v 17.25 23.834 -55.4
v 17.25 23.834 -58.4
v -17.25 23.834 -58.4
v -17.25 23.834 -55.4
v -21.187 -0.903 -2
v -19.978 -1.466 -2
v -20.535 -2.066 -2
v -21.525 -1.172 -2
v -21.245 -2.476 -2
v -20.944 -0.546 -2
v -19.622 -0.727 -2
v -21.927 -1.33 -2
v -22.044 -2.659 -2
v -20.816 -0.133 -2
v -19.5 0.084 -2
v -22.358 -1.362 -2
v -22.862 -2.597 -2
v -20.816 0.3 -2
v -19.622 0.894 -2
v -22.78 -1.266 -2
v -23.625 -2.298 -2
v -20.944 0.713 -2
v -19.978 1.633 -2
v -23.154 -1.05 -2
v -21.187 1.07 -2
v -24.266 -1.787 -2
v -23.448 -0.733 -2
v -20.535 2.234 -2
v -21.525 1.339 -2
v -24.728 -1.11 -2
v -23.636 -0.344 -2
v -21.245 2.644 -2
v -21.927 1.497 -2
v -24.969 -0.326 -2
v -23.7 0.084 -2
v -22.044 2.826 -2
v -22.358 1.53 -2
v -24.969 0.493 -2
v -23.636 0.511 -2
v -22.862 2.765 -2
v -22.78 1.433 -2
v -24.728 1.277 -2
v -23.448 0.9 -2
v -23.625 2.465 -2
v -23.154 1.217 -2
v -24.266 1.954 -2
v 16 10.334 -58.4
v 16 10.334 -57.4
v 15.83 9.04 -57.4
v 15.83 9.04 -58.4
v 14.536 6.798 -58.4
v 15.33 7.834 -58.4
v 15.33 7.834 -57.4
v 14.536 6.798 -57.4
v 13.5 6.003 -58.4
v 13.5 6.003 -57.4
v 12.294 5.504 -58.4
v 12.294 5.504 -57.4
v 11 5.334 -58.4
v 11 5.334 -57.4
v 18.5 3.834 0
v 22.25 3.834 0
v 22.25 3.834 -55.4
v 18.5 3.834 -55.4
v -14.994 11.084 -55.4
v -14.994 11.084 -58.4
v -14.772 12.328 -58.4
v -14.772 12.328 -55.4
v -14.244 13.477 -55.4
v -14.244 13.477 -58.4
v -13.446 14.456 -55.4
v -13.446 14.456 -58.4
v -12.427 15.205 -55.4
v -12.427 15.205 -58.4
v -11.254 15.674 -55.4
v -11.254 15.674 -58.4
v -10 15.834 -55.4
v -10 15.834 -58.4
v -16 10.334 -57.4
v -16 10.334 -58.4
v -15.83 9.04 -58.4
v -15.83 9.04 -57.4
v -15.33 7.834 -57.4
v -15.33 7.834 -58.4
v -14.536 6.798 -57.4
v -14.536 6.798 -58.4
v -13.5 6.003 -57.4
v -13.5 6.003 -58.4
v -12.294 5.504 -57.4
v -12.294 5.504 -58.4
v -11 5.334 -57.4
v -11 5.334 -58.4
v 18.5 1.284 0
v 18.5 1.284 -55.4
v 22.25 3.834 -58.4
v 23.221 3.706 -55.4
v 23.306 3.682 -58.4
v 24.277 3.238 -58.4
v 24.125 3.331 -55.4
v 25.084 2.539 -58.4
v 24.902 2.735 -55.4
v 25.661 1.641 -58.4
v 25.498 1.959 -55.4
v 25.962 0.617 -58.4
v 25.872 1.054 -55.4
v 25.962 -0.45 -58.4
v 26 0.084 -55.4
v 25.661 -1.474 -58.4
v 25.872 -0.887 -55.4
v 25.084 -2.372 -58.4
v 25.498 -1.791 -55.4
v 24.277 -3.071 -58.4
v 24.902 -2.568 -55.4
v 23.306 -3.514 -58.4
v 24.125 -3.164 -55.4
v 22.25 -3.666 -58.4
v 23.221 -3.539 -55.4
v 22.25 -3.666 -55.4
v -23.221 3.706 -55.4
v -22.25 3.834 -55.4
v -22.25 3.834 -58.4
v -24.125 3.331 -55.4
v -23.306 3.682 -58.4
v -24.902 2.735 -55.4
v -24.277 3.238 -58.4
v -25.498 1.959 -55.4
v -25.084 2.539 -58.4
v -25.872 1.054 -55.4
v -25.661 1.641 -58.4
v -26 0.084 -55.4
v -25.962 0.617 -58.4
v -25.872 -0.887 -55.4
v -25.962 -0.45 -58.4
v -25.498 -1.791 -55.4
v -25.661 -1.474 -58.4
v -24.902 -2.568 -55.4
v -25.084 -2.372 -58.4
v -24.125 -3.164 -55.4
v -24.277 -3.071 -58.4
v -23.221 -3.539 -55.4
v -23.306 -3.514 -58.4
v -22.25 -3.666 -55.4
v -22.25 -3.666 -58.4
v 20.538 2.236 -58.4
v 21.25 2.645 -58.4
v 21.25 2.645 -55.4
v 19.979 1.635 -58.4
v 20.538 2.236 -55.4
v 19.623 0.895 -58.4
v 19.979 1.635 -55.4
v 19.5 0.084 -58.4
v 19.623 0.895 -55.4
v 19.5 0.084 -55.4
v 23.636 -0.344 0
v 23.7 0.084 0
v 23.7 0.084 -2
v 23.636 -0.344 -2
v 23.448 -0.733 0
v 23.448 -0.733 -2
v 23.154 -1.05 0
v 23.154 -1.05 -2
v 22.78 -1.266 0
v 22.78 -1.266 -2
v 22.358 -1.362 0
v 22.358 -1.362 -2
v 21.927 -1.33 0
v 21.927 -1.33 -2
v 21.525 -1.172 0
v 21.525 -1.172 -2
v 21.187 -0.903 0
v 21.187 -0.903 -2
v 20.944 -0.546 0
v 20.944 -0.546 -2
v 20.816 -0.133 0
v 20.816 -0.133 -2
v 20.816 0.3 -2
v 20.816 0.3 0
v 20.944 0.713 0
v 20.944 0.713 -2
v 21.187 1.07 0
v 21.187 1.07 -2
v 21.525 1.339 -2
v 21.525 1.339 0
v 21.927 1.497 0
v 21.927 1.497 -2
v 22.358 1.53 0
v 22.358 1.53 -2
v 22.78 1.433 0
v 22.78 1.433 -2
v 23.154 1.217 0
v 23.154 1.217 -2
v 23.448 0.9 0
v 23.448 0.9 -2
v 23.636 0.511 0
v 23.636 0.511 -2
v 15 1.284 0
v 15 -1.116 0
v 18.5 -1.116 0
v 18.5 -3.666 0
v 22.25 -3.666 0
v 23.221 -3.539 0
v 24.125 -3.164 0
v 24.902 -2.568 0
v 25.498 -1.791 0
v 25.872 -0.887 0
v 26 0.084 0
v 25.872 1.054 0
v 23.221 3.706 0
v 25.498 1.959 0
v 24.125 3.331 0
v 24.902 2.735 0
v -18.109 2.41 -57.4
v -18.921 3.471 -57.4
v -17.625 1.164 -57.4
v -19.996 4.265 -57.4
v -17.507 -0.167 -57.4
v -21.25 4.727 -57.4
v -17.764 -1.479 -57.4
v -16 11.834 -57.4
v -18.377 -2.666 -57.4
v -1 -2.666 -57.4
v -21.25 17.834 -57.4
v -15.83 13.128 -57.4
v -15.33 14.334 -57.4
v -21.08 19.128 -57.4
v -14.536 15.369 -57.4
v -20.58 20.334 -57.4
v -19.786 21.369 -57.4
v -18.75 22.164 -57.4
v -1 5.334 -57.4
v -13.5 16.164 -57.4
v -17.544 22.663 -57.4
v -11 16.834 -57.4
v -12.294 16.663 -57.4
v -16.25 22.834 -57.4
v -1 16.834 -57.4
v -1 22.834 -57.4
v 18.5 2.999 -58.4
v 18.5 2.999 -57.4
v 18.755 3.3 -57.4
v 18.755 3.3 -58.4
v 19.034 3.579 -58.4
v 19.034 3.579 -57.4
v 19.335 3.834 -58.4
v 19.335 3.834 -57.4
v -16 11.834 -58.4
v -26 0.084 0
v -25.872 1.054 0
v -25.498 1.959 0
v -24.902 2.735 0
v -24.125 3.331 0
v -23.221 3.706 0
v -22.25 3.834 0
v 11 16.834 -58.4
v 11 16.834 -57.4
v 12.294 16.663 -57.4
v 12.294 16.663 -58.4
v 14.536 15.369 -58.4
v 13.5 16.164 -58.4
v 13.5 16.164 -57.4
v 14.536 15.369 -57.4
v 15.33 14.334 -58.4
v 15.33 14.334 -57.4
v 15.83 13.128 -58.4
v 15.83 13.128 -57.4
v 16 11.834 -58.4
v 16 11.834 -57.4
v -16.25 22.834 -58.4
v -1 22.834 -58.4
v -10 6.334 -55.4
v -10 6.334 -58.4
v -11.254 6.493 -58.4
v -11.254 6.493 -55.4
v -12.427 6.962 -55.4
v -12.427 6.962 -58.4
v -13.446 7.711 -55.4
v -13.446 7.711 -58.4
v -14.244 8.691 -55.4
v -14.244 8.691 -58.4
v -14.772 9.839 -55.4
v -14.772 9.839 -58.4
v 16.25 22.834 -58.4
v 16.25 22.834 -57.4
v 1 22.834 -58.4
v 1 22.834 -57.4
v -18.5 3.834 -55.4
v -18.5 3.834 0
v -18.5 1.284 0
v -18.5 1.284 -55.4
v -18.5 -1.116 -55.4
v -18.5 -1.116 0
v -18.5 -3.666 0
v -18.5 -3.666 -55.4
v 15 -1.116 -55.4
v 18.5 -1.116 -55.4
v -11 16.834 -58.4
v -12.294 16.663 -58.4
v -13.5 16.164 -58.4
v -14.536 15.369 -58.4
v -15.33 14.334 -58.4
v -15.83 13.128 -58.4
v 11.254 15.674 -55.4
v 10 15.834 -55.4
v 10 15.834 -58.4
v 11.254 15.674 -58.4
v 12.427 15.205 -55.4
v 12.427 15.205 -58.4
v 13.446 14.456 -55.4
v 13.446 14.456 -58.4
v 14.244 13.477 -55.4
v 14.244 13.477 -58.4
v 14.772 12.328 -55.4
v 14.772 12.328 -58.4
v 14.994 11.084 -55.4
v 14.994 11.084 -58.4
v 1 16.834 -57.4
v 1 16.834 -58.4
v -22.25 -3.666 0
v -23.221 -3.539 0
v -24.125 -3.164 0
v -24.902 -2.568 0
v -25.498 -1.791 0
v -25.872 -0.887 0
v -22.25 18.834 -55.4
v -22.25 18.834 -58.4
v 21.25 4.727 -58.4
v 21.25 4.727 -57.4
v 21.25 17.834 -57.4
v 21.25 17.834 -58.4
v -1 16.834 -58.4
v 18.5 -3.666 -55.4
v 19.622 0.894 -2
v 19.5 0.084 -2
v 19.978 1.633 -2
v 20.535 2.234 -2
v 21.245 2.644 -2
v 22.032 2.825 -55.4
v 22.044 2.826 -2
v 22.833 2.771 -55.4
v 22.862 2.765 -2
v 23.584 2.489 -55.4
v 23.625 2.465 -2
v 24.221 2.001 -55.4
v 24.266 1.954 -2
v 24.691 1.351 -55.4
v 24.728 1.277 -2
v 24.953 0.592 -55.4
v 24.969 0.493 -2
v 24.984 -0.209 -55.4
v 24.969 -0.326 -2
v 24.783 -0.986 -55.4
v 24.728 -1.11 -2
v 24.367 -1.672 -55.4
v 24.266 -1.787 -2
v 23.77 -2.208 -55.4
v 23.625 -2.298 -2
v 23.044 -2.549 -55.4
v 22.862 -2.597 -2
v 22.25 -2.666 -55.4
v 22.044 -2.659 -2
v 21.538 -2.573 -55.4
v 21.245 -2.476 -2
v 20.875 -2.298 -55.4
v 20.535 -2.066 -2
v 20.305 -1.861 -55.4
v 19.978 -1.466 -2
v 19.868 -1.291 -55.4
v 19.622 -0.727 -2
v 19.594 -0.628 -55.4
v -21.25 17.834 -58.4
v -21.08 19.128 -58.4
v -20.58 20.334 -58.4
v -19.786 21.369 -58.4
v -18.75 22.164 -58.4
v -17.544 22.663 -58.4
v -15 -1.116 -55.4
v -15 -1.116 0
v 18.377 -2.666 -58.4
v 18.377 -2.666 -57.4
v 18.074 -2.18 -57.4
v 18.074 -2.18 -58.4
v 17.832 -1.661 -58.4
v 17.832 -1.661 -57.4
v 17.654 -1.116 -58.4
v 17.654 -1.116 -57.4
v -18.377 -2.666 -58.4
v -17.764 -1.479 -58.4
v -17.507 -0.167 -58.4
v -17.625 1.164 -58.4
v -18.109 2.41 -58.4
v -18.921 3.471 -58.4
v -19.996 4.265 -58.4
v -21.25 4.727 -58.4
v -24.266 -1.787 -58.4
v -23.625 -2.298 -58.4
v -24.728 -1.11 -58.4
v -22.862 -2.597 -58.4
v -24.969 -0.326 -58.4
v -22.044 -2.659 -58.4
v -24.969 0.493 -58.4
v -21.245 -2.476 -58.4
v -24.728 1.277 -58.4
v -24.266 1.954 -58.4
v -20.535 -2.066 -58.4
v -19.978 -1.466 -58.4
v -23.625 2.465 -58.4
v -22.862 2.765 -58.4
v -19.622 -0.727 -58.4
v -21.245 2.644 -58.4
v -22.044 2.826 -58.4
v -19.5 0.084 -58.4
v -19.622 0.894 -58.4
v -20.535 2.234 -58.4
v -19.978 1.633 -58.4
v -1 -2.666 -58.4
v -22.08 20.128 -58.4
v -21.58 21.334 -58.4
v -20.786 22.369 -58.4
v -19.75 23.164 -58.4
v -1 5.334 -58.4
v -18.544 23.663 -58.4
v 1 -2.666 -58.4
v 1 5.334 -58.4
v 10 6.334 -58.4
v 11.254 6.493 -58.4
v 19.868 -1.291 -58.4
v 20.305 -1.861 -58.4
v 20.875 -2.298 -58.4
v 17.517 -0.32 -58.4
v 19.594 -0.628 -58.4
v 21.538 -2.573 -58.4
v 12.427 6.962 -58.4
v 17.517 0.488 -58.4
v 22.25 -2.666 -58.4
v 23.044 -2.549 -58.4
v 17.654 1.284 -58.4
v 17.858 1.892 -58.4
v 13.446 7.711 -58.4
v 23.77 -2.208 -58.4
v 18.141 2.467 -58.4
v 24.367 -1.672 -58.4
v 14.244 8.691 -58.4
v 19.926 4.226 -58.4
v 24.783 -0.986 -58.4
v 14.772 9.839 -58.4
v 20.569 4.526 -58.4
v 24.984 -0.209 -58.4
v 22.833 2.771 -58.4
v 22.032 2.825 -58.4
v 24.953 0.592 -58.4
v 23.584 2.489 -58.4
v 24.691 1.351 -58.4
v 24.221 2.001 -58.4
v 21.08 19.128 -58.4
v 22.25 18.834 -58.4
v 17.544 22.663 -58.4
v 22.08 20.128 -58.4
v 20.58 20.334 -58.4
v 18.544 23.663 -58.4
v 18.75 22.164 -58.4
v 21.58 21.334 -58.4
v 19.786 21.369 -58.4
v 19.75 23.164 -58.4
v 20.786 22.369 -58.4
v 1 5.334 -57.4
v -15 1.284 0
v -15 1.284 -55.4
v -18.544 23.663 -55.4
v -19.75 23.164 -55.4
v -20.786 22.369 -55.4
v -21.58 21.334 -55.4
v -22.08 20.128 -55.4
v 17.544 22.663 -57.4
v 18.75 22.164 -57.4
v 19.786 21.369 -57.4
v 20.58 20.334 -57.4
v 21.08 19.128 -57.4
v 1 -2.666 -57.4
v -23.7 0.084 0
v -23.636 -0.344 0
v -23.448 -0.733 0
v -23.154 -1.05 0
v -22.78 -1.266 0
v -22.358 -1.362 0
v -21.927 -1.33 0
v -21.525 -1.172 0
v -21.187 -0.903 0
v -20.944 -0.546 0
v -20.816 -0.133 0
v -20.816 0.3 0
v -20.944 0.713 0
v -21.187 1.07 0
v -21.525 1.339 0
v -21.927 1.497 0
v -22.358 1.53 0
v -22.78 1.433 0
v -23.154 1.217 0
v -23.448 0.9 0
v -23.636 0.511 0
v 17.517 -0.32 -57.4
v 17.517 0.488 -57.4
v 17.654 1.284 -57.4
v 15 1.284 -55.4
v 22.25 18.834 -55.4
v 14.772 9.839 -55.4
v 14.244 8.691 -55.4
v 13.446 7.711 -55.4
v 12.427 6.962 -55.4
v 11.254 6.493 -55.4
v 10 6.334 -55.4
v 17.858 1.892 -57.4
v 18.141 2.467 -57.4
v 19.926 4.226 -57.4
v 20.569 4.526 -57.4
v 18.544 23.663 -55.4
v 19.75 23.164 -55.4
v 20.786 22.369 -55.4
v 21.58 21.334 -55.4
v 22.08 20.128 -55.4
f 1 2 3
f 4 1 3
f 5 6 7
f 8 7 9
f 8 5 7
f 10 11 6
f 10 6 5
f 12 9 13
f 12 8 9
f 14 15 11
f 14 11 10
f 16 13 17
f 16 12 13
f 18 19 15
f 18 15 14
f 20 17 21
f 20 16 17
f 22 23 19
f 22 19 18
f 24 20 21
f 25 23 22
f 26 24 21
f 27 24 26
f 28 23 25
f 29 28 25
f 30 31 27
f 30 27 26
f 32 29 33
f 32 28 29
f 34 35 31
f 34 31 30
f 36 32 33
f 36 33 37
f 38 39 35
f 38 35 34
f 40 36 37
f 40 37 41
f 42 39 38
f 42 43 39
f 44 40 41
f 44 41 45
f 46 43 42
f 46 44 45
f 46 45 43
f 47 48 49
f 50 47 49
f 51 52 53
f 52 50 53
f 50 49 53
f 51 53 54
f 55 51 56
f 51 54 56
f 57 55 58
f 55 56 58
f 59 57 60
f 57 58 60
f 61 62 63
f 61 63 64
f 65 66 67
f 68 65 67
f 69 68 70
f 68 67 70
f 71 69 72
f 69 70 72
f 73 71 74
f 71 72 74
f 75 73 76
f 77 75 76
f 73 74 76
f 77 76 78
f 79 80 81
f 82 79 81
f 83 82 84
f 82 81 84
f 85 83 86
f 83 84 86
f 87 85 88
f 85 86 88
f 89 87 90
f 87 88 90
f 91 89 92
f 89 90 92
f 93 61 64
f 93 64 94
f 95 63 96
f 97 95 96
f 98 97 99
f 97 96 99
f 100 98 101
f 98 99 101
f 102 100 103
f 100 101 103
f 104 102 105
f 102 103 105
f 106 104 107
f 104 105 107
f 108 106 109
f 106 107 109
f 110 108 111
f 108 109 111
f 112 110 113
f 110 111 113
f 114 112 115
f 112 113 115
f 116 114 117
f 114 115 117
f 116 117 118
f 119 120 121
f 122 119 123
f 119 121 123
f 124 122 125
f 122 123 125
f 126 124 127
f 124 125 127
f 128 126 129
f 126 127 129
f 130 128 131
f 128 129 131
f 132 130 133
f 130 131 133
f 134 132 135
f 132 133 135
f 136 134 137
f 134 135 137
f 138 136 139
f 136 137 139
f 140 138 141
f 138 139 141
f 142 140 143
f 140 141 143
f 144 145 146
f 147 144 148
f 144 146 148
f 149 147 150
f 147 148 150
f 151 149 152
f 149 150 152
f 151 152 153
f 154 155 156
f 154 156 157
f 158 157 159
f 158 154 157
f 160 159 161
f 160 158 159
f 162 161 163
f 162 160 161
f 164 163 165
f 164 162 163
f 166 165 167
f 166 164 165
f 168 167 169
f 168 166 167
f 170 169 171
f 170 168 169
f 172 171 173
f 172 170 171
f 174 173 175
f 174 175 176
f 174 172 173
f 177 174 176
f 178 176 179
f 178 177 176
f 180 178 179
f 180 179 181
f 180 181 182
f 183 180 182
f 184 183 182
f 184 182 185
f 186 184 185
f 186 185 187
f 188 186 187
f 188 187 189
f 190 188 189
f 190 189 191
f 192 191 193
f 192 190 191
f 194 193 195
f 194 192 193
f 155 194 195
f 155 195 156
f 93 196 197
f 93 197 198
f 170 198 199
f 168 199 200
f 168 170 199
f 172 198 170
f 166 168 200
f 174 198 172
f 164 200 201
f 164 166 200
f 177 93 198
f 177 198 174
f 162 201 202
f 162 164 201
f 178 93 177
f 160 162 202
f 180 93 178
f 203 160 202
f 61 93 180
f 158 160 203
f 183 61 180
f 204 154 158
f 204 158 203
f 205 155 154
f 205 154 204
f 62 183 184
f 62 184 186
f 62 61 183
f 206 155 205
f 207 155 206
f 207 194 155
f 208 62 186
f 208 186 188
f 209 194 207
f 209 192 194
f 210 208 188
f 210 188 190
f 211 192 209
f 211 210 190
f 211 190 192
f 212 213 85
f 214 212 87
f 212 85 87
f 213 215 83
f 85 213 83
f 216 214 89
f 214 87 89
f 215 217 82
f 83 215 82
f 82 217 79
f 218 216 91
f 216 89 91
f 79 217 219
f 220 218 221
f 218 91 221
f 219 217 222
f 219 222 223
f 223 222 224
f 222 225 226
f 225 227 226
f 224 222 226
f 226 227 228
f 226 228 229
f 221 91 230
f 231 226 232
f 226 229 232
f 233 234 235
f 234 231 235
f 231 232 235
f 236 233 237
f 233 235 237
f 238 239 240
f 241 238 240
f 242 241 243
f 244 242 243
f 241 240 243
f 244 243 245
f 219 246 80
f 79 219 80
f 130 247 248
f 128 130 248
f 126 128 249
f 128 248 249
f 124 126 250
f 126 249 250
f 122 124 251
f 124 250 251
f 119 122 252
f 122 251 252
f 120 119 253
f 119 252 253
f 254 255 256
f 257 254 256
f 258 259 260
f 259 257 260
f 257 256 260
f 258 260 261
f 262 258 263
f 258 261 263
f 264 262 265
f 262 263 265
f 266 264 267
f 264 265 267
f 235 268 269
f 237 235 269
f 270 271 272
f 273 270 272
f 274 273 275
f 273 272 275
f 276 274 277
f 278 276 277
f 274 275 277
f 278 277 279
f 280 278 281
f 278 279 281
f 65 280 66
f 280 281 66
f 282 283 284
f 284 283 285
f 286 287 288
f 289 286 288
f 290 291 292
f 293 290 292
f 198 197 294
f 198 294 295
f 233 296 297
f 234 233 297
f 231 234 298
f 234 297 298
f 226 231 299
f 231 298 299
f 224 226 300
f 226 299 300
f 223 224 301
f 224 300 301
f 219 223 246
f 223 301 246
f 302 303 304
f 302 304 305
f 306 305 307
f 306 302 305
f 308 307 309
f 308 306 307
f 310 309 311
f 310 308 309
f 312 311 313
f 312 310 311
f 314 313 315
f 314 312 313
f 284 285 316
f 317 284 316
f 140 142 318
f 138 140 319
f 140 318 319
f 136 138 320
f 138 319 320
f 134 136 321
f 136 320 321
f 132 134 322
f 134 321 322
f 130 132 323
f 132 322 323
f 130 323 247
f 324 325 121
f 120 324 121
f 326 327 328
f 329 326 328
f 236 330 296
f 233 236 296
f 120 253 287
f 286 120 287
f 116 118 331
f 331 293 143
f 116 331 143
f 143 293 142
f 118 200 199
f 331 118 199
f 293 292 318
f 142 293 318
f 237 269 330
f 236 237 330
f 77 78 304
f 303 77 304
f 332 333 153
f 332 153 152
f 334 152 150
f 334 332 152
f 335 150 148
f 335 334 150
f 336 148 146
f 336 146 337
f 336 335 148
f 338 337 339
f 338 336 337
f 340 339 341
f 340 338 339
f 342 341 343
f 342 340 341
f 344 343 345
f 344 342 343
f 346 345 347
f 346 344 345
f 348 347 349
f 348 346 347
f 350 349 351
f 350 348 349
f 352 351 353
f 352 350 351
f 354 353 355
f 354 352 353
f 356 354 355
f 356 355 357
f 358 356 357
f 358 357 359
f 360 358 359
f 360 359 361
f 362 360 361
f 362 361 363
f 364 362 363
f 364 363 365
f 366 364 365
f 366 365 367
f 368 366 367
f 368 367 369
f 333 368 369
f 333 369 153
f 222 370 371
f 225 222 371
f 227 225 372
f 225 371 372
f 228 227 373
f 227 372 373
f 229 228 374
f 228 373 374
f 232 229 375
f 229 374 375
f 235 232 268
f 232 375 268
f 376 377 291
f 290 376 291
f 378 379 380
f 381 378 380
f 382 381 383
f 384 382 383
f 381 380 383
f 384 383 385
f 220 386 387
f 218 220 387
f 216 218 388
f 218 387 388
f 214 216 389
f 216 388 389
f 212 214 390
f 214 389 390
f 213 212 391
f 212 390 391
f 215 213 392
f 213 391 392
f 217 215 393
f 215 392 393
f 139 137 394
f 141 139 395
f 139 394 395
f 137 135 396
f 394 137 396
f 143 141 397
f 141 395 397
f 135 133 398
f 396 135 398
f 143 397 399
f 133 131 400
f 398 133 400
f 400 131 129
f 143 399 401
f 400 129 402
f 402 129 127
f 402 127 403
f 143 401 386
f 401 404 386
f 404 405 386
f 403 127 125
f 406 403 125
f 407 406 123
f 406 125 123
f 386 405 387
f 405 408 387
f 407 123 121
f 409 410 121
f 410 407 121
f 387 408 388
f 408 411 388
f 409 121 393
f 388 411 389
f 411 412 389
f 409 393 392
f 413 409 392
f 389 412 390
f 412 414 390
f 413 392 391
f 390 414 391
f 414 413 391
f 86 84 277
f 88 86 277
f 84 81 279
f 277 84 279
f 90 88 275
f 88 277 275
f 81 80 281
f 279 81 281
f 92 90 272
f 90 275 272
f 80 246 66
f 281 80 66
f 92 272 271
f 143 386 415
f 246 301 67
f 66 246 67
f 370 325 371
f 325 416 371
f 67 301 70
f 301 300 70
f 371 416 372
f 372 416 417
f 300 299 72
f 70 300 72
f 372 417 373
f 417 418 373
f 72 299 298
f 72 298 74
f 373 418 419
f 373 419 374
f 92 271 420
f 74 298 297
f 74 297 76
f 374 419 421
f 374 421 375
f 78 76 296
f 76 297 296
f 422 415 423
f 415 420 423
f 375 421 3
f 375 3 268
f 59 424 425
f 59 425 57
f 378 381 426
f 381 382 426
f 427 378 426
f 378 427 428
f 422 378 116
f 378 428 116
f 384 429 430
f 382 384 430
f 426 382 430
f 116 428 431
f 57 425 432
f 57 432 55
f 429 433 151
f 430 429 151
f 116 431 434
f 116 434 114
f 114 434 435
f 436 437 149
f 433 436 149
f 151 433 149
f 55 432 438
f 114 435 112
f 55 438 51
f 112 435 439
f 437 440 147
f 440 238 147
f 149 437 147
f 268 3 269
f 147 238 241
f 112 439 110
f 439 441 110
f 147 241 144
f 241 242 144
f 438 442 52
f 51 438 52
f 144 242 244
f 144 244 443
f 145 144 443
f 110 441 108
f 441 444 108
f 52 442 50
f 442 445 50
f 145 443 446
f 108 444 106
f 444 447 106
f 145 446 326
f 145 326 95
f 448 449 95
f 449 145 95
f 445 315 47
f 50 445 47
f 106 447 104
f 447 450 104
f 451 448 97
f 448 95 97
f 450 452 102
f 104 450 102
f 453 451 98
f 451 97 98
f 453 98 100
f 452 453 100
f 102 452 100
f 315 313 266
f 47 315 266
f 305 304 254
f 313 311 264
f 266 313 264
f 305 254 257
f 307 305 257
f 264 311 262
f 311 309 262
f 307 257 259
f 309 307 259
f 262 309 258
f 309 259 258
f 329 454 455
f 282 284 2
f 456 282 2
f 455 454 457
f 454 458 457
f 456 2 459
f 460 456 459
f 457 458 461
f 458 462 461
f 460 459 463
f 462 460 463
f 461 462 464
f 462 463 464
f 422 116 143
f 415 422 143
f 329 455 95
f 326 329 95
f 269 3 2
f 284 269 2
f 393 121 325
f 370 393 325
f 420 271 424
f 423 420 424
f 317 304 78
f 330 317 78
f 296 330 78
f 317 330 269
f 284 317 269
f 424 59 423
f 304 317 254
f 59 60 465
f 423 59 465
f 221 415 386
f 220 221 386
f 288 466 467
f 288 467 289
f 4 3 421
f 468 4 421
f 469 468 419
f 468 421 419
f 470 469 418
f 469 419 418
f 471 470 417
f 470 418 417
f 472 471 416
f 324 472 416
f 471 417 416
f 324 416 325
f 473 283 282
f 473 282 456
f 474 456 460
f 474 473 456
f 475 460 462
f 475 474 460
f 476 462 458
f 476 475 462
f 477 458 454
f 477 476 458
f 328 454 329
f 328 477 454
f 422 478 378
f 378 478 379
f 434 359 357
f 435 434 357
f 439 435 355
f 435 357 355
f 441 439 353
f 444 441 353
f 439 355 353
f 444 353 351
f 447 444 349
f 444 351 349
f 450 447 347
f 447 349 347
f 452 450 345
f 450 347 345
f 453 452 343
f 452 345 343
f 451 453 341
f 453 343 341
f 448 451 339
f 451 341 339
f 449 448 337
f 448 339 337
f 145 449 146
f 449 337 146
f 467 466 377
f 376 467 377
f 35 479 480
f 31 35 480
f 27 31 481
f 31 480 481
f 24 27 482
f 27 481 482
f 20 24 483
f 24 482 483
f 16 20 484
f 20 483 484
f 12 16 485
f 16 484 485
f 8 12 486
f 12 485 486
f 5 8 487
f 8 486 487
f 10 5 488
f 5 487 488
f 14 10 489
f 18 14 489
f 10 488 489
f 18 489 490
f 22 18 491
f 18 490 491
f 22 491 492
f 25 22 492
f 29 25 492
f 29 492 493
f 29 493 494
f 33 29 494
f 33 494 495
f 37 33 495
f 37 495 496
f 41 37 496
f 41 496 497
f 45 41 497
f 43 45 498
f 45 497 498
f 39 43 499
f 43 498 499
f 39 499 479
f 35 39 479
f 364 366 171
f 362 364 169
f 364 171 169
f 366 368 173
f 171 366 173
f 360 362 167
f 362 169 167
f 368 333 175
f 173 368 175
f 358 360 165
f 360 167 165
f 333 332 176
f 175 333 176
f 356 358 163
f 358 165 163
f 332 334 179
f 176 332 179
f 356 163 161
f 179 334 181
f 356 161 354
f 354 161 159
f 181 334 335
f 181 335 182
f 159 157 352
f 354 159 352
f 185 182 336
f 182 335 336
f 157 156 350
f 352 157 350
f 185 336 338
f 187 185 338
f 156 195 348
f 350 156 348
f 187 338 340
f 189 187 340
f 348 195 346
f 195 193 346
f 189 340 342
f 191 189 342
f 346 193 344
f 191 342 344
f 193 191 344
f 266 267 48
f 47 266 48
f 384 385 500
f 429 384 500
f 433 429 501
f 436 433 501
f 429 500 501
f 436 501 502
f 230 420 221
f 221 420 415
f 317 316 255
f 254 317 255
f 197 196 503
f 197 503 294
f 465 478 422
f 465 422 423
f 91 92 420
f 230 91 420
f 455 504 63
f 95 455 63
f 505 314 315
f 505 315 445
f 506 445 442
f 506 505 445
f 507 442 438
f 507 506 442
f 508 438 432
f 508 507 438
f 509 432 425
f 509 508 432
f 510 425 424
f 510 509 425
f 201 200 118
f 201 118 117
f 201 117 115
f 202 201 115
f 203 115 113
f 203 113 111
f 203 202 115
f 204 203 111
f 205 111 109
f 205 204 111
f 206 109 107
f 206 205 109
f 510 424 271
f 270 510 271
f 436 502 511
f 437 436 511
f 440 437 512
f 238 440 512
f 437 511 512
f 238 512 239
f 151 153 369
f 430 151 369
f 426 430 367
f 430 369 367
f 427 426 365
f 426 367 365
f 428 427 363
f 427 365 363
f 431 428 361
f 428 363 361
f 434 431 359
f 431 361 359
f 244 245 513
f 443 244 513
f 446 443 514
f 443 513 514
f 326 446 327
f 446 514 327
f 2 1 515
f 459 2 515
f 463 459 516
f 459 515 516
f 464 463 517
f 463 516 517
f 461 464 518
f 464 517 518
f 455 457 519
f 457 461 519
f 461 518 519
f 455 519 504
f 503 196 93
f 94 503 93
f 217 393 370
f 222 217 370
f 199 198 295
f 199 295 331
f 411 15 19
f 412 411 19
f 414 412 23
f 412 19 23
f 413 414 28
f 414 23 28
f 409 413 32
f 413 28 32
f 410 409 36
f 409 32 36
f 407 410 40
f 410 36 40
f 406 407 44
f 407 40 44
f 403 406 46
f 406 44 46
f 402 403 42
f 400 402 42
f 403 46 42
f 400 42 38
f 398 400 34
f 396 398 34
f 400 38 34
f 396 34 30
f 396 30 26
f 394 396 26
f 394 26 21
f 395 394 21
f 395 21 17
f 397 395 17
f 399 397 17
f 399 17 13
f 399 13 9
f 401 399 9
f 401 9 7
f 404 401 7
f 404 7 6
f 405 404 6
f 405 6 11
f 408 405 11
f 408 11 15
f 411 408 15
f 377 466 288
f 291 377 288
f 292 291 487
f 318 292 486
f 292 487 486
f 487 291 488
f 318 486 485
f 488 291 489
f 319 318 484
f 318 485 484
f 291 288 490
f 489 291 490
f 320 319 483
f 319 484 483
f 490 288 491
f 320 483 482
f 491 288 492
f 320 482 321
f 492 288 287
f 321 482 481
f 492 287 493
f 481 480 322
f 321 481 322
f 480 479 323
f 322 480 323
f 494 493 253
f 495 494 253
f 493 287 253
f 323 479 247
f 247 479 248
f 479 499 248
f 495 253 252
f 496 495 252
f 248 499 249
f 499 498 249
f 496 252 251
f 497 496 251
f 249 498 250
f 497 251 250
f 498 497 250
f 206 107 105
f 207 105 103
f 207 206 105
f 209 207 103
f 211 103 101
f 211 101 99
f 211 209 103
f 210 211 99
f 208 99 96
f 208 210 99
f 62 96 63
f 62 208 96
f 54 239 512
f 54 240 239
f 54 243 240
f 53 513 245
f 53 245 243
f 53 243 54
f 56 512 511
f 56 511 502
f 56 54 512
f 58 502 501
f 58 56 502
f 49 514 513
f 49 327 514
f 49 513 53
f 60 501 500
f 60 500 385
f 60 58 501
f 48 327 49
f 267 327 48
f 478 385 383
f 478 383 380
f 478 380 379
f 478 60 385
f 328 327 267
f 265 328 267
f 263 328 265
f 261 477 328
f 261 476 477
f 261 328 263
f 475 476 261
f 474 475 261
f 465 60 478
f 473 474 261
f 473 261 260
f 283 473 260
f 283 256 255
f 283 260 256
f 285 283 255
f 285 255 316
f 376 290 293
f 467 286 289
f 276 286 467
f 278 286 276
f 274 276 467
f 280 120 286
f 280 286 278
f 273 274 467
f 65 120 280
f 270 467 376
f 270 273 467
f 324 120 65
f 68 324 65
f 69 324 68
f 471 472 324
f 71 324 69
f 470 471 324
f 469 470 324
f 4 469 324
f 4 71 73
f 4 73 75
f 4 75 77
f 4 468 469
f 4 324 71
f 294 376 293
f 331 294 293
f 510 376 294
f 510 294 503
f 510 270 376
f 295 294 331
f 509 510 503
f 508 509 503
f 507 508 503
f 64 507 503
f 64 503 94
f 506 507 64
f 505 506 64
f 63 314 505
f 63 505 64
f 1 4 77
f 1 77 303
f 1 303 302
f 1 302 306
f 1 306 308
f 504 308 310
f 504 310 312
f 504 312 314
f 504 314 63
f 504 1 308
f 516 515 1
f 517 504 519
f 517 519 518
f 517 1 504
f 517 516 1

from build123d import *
from build123d.topology import SkipClean

# Parameters (mm, degrees)
SKETCH_1_W           = 3.5
SKETCH_1_H           = 1.2
EXTRUDE_1_DEPTH      = 55.4
EXTRUDE_2_DEPTH      = 2
SKETCH_2_W           = 1
SKETCH_2_H           = 8
EXTRUDE_4_DEPTH      = 2
SKETCH_2_3_W         = 1
SKETCH_2_3_H         = 8
EXTRUDE_6_DEPTH      = 3
FILLET_1_R           = 5
MIRROR_START         = -57.4
MIRROR_2_OUTLINE_R   = 2.75
MIRROR_2_DEPTH       = 2
MIRROR_START_2       = -58.4
MIRROR_2_2_OUTLINE_R = 2.75
MIRROR_2_2_DEPTH     = 1


# Read off the part's stored shape, not the designer's step: 镜向2
with BuildPart() as part:
    # 草图1 → 拉伸1 (new body)
    with BuildSketch(Plane.XY):
        with BuildLine():
            ThreePointArc((19.5, 0.083609377), (22.25, 2.833609377), (25, 0.083609377))
            Line((25, 0.083609377), (26, 0.083609377))
            ThreePointArc((26, 0.083609377), (24.901650429, 2.735259807), (22.25, 3.833609377))
            ThreePointArc((22.25, 3.833609377), (19.598349571, 2.735259807), (18.5, 0.083609377))
            Line((18.5, 0.083609377), (19.5, 0.083609377))
        make_face()
        with BuildLine():
            Line((26, 0.083609377), (25, 0.083609377))
            ThreePointArc((25, 0.083609377), (22.25, -2.666390623), (19.5, 0.083609377))
            Line((19.5, 0.083609377), (18.5, 0.083609377))
            ThreePointArc((18.5, 0.083609377), (19.598349571, -2.568041052), (22.25, -3.666390623))
            ThreePointArc((22.25, -3.666390623), (24.901650429, -2.568041052), (26, 0.083609377))
        make_face()
        with BuildLine():
            ThreePointArc((19.5, 0.083609377), (22.25, 2.833609377), (25, 0.083609377))
            Line((25, 0.083609377), (26, 0.083609377))
            ThreePointArc((26, 0.083609377), (24.901650429, 2.735259807), (22.25, 3.833609377))
            ThreePointArc((22.25, 3.833609377), (19.598349571, 2.735259807), (18.5, 0.083609377))
            Line((18.5, 0.083609377), (19.5, 0.083609377))
        make_face()
        with BuildLine():
            Line((26, 0.083609377), (25, 0.083609377))
            ThreePointArc((25, 0.083609377), (22.25, -2.666390623), (19.5, 0.083609377))
            Line((19.5, 0.083609377), (18.5, 0.083609377))
            ThreePointArc((18.5, 0.083609377), (19.598349571, -2.568041052), (22.25, -3.666390623))
            ThreePointArc((22.25, -3.666390623), (24.901650429, -2.568041052), (26, 0.083609377))
        make_face()
        with BuildLine():
            ThreePointArc((18.5, 0.083609377), (19.598349571, 2.735259807), (22.25, 3.833609377))
            Line((22.25, 3.833609377), (18.5, 3.833609377))
            Line((18.5, 3.833609377), (18.5, 1.283609377))
            Line((18.5, 1.283609377), (18.5, 0.083609377))
        make_face()
        with BuildLine():
            Line((18.5, -3.666390623), (22.25, -3.666390623))
            ThreePointArc((22.25, -3.666390623), (19.598349571, -2.568041052), (18.5, 0.083609377))
            Line((18.5, 0.083609377), (18.5, -1.116390623))
            Line((18.5, -1.116390623), (18.5, -3.666390623))
        make_face()
        with Locations((16.75, -0.516390623)):
            Rectangle(SKETCH_1_W, SKETCH_1_H)
        with Locations((16.75, 0.683609377)):
            Rectangle(SKETCH_1_W, SKETCH_1_H)
    extrude_1 = extrude(amount=-EXTRUDE_1_DEPTH)

    # 草图1<3> → 拉伸2 (add)
    with BuildSketch(Plane.XY):
        with BuildLine():
            ThreePointArc((20.8, 0.083609377), (22.25, 1.533609377), (23.7, 0.083609377))
            Line((23.7, 0.083609377), (25, 0.083609377))
            ThreePointArc((25, 0.083609377), (22.25, 2.833609377), (19.5, 0.083609377))
            Line((19.5, 0.083609377), (20.8, 0.083609377))
        make_face()
        with BuildLine():
            Line((25, 0.083609377), (23.7, 0.083609377))
            ThreePointArc((23.7, 0.083609377), (22.25, -1.366390623), (20.8, 0.083609377))
            Line((20.8, 0.083609377), (19.5, 0.083609377))
            ThreePointArc((19.5, 0.083609377), (22.25, -2.666390623), (25, 0.083609377))
        make_face()
        with BuildLine():
            ThreePointArc((20.8, 0.083609377), (22.25, 1.533609377), (23.7, 0.083609377))
            Line((23.7, 0.083609377), (25, 0.083609377))
            ThreePointArc((25, 0.083609377), (22.25, 2.833609377), (19.5, 0.083609377))
            Line((19.5, 0.083609377), (20.8, 0.083609377))
        make_face()
        with BuildLine():
            Line((25, 0.083609377), (23.7, 0.083609377))
            ThreePointArc((23.7, 0.083609377), (22.25, -1.366390623), (20.8, 0.083609377))
            Line((20.8, 0.083609377), (19.5, 0.083609377))
            ThreePointArc((19.5, 0.083609377), (22.25, -2.666390623), (25, 0.083609377))
        make_face()
    extrude_2 = extrude(amount=-EXTRUDE_2_DEPTH)

    # 草图2 → 拉伸4 (add)
    # profile 1 of 10: a face of its own
    with SkipClean():  # the faces are left unmerged after this step: merging them gives an invalid solid
        with BuildSketch(Plane(origin=(0, 0, -55.4), x_dir=(-1, 0, 0), z_dir=(0, 0, -1))):
            with BuildLine():
                Line((-22.25, 23.833609377), (-22.25, 3.833609377))
                Line((-22.25, 3.833609377), (-19.334524053, 3.833609377))
                ThreePointArc((-19.334524053, 3.833609377), (-20.241930491, 4.388276246), (-21.25, 4.727153282))
                Line((-21.25, 4.727153282), (-21.25, 22.833609377))
                Line((-21.25, 22.833609377), (-1, 22.833609377))
                Line((-1, 22.833609377), (-1, 16.833609377))
                Line((-1, 16.833609377), (-16, 16.833609377))
                Line((-16, 16.833609377), (-16, 5.333609377))
                Line((-16, 5.333609377), (-1, 5.333609377))
                Line((-1, 5.333609377), (0, 5.333609377))
                Line((0, 5.333609377), (0, 6.333609377))
                Line((0, 6.333609377), (-15, 6.333609377))
                Line((-15, 6.333609377), (-15, 15.833609377))
                Line((-15, 15.833609377), (0, 15.833609377))
                Line((0, 15.833609377), (0, 23.833609377))
                Line((0, 23.833609377), (-22.25, 23.833609377))
            make_face()
        # profile 2 of 10: a face of its own
        with BuildSketch(Plane(origin=(0, 0, -55.4), x_dir=(-1, 0, 0), z_dir=(0, 0, -1))):
            with BuildLine():
                ThreePointArc((-17.654077894, -1.116390623), (-17.945210239, -1.924196667), (-18.377016654, -2.666390623))
                Line((-18.377016654, -2.666390623), (-1, -2.666390623))
                Line((-1, -2.666390623), (-1, 5.333609377))
                Line((-1, 5.333609377), (-16, 5.333609377))
                Line((-16, 5.333609377), (-16, 16.833609377))
                Line((-16, 16.833609377), (-1, 16.833609377))
                Line((-1, 16.833609377), (-1, 22.833609377))
                Line((-1, 22.833609377), (-21.25, 22.833609377))
                Line((-21.25, 22.833609377), (-21.25, 4.727153282))
                ThreePointArc((-21.25, 4.727153282), (-20.241930491, 4.388276246), (-19.334524053, 3.833609377))
                Line((-19.334524053, 3.833609377), (-18.5, 3.833609377))
                Line((-18.5, 3.833609377), (-18.5, 2.999085325))
                ThreePointArc((-18.5, 2.999085325), (-17.989798317, 2.184366769), (-17.654077894, 1.283609377))
                Line((-17.654077894, 1.283609377), (-15, 1.283609377))
                Line((-15, 1.283609377), (-15, -1.116390623))
                Line((-15, -1.116390623), (-17.654077894, -1.116390623))
            make_face()
        # profile 3 of 10: a face of its own
        with BuildSketch(Plane(origin=(0, 0, -55.4), x_dir=(-1, 0, 0), z_dir=(0, 0, -1))):
            with Locations((-0.5, 1.333609377)):
                Rectangle(SKETCH_2_W, SKETCH_2_H)
        # profile 4 of 10: a face of its own
        with BuildSketch(Plane(origin=(0, 0, -55.4), x_dir=(-1, 0, 0), z_dir=(0, 0, -1))):
            with BuildLine():
                ThreePointArc((-17.654077894, 1.283609377), (-17.989798317, 2.184366769), (-18.5, 2.999085325))
                Line((-18.5, 2.999085325), (-18.5, 1.283609377))
                Line((-18.5, 1.283609377), (-17.654077894, 1.283609377))
            make_face()
        # profile 5 of 10: a face of its own
        with BuildSketch(Plane(origin=(0, 0, -55.4), x_dir=(-1, 0, 0), z_dir=(0, 0, -1))):
            with BuildLine():
                Line((-18.5, -1.116390623), (-18.5, -2.666390623))
                Line((-18.5, -2.666390623), (-18.377016654, -2.666390623))
                ThreePointArc((-18.377016654, -2.666390623), (-17.945210239, -1.924196667), (-17.654077894, -1.116390623))
                Line((-17.654077894, -1.116390623), (-18.5, -1.116390623))
            make_face()
        # profile 6 of 10: a face of its own
        with BuildSketch(Plane(origin=(0, 0, -55.4), x_dir=(-1, 0, 0), z_dir=(0, 0, -1))):
            with BuildLine():
                ThreePointArc((-17.654077894, 1.283609377), (-17.5, 0.083609377), (-17.654077894, -1.116390623))
                Line((-17.654077894, -1.116390623), (-15, -1.116390623))
                Line((-15, -1.116390623), (-15, 1.283609377))
                Line((-15, 1.283609377), (-17.654077894, 1.283609377))
            make_face()
        # profile 7 of 10: a face of its own
        with BuildSketch(Plane(origin=(0, 0, -55.4), x_dir=(-1, 0, 0), z_dir=(0, 0, -1))):
            with BuildLine():
                Line((-22.25, -3.666390623), (-18.5, -3.666390623))
                Line((-18.5, -3.666390623), (-18.5, -2.666390623))
                Line((-18.5, -2.666390623), (-18.5, -1.116390623))
                Line((-18.5, -1.116390623), (-17.654077894, -1.116390623))
                ThreePointArc((-17.654077894, -1.116390623), (-17.5, 0.083609377), (-17.654077894, 1.283609377))
                Line((-17.654077894, 1.283609377), (-18.5, 1.283609377))
                Line((-18.5, 1.283609377), (-18.5, 2.999085325))
                ThreePointArc((-18.5, 2.999085325), (-18.891242789, 3.442366588), (-19.334524053, 3.833609377))
                Line((-19.334524053, 3.833609377), (-22.25, 3.833609377))
                ThreePointArc((-22.25, 3.833609377), (-21.745411195, 3.799506327), (-21.25, 3.697817451))
                ThreePointArc((-21.25, 3.697817451), (-19.265665903, 2.354347143), (-18.5, 0.083609377))
                ThreePointArc((-18.5, 0.083609377), (-19.598349571, -2.568041052), (-22.25, -3.666390623))
            make_face()
        # profile 8 of 10: a face of its own
        with BuildSketch(Plane(origin=(0, 0, -55.4), x_dir=(-1, 0, 0), z_dir=(0, 0, -1))):
            with BuildLine():
                ThreePointArc((-22.25, 3.833609377), (-26, 0.083609377), (-22.25, -3.666390623))
                ThreePointArc((-22.25, -3.666390623), (-19.598349571, -2.568041052), (-18.5, 0.083609377))
                ThreePointArc((-18.5, 0.083609377), (-19.265665903, 2.354347143), (-21.25, 3.697817451))
                ThreePointArc((-21.25, 3.697817451), (-21.745411195, 3.799506327), (-22.25, 3.833609377))
            make_face()
            with BuildLine():
                ThreePointArc((-22.25, -2.666390623), (-24.952524621, 0.592392901), (-21.25, 2.645347069))
                ThreePointArc((-21.25, 2.645347069), (-19.979262234, 1.634818583), (-19.5, 0.083609377))
                ThreePointArc((-19.5, 0.083609377), (-20.305456352, -1.860934271), (-22.25, -2.666390623))
            make_face(mode=Mode.SUBTRACT)
        # profile 9 of 10: a face of its own
        with BuildSketch(Plane(origin=(0, 0, -55.4), x_dir=(-1, 0, 0), z_dir=(0, 0, -1))):
            Polygon((-18.5, -2.666390623), (-18.5, -3.666390623), (0, -3.666390623), (0, -2.666390623), (-1, -2.666390623), (-18.377016654, -2.666390623), align=None)
        # profile 10 of 10: a face of its own
        with BuildSketch(Plane(origin=(0, 0, -55.4), x_dir=(-1, 0, 0), z_dir=(0, 0, -1))):
            with BuildLine():
                Line((-18.5, 3.833609377), (-19.334524053, 3.833609377))
                ThreePointArc((-19.334524053, 3.833609377), (-18.891242789, 3.442366588), (-18.5, 2.999085325))
                Line((-18.5, 2.999085325), (-18.5, 3.833609377))
            make_face()
        extrude(amount=EXTRUDE_4_DEPTH)

    # 草图2<3> → 拉伸6 (add)
    # profile 1 of 7: a face of its own
    with SkipClean():  # the faces are left unmerged after this step: merging them gives an invalid solid
        with BuildSketch(Plane(origin=(0, 0, -55.4), x_dir=(-1, 0, 0), z_dir=(0, 0, -1))):
            with BuildLine():
                Line((-22.25, 23.833609377), (-22.25, 3.833609377))
                Line((-22.25, 3.833609377), (-19.334524053, 3.833609377))
                ThreePointArc((-19.334524053, 3.833609377), (-20.241930491, 4.388276246), (-21.25, 4.727153282))
                Line((-21.25, 4.727153282), (-21.25, 22.833609377))
                Line((-21.25, 22.833609377), (-1, 22.833609377))
                Line((-1, 22.833609377), (-1, 16.833609377))
                Line((-1, 16.833609377), (-16, 16.833609377))
                Line((-16, 16.833609377), (-16, 5.333609377))
                Line((-16, 5.333609377), (-1, 5.333609377))
                Line((-1, 5.333609377), (0, 5.333609377))
                Line((0, 5.333609377), (0, 6.333609377))
                Line((0, 6.333609377), (-15, 6.333609377))
                Line((-15, 6.333609377), (-15, 15.833609377))
                Line((-15, 15.833609377), (0, 15.833609377))
                Line((0, 15.833609377), (0, 23.833609377))
                Line((0, 23.833609377), (-22.25, 23.833609377))
            make_face()
        # profile 2 of 7: a face of its own
        with BuildSketch(Plane(origin=(0, 0, -55.4), x_dir=(-1, 0, 0), z_dir=(0, 0, -1))):
            with BuildLine():
                Line((-22.25, -3.666390623), (-18.5, -3.666390623))
                Line((-18.5, -3.666390623), (-18.5, -2.666390623))
                Line((-18.5, -2.666390623), (-18.5, -1.116390623))
                Line((-18.5, -1.116390623), (-17.654077894, -1.116390623))
                ThreePointArc((-17.654077894, -1.116390623), (-17.5, 0.083609377), (-17.654077894, 1.283609377))
                Line((-17.654077894, 1.283609377), (-18.5, 1.283609377))
                Line((-18.5, 1.283609377), (-18.5, 2.999085325))
                ThreePointArc((-18.5, 2.999085325), (-18.891242789, 3.442366588), (-19.334524053, 3.833609377))
                Line((-19.334524053, 3.833609377), (-22.25, 3.833609377))
                ThreePointArc((-22.25, 3.833609377), (-21.745411195, 3.799506327), (-21.25, 3.697817451))
                ThreePointArc((-21.25, 3.697817451), (-19.265665903, 2.354347143), (-18.5, 0.083609377))
                ThreePointArc((-18.5, 0.083609377), (-19.598349571, -2.568041052), (-22.25, -3.666390623))
            make_face()
        # profile 3 of 7: a face of its own
        with BuildSketch(Plane(origin=(0, 0, -55.4), x_dir=(-1, 0, 0), z_dir=(0, 0, -1))):
            with BuildLine():
                ThreePointArc((-17.654077894, 1.283609377), (-17.989798317, 2.184366769), (-18.5, 2.999085325))
                Line((-18.5, 2.999085325), (-18.5, 1.283609377))
                Line((-18.5, 1.283609377), (-17.654077894, 1.283609377))
            make_face()
        # profile 4 of 7: a face of its own
        with BuildSketch(Plane(origin=(0, 0, -55.4), x_dir=(-1, 0, 0), z_dir=(0, 0, -1))):
            with BuildLine():
                Line((-18.5, -1.116390623), (-18.5, -2.666390623))
                Line((-18.5, -2.666390623), (-18.377016654, -2.666390623))
                ThreePointArc((-18.377016654, -2.666390623), (-17.945210239, -1.924196667), (-17.654077894, -1.116390623))
                Line((-17.654077894, -1.116390623), (-18.5, -1.116390623))
            make_face()
        # profile 5 of 7: a face of its own
        with BuildSketch(Plane(origin=(0, 0, -55.4), x_dir=(-1, 0, 0), z_dir=(0, 0, -1))):
            Polygon((-18.5, -2.666390623), (-18.5, -3.666390623), (0, -3.666390623), (0, -2.666390623), (-1, -2.666390623), (-18.377016654, -2.666390623), align=None)
        # profile 6 of 7: a face of its own
        with BuildSketch(Plane(origin=(0, 0, -55.4), x_dir=(-1, 0, 0), z_dir=(0, 0, -1))):
            with Locations((-0.5, 1.333609377)):
                Rectangle(SKETCH_2_3_W, SKETCH_2_3_H)
        # profile 7 of 7: a face of its own
        with BuildSketch(Plane(origin=(0, 0, -55.4), x_dir=(-1, 0, 0), z_dir=(0, 0, -1))):
            with BuildLine():
                ThreePointArc((-22.25, 3.833609377), (-26, 0.083609377), (-22.25, -3.666390623))
                ThreePointArc((-22.25, -3.666390623), (-19.598349571, -2.568041052), (-18.5, 0.083609377))
                ThreePointArc((-18.5, 0.083609377), (-19.265665903, 2.354347143), (-21.25, 3.697817451))
                ThreePointArc((-21.25, 3.697817451), (-21.745411195, 3.799506327), (-22.25, 3.833609377))
            make_face()
            with BuildLine():
                ThreePointArc((-22.25, -2.666390623), (-24.952524621, 0.592392901), (-21.25, 2.645347069))
                ThreePointArc((-21.25, 2.645347069), (-19.979262234, 1.634818583), (-19.5, 0.083609377))
                ThreePointArc((-19.5, 0.083609377), (-20.305456352, -1.860934271), (-22.25, -2.666390623))
            make_face(mode=Mode.SUBTRACT)
        extrude(amount=EXTRUDE_6_DEPTH)

    # 圆角1
    # the kernel refuses this fillet: 5 mm, written as the material it adds along each edge
    with BuildSketch(Plane(origin=(21.25, 22.833609377, -44.9), x_dir=(0, -1, 0), z_dir=(0, 0, -1))) as fillet_1_piece_1_section:
        with BuildLine():
            CenterArc((FILLET_1_R, FILLET_1_R), FILLET_1_R, 180, 90)
            Line((0, FILLET_1_R), (0, 0))
            Line((0, 0), (FILLET_1_R, 0))
        make_face()
    fillet_1_piece_1 = extrude(amount=13.5, mode=Mode.PRIVATE)
    fillet_1_piece_1 = split(fillet_1_piece_1, bisect_by=Plane(origin=(20.133160305, 21.716769682, -55.4), z_dir=(0, 0, -1)), keep=Keep.TOP, mode=Mode.PRIVATE)
    add(fillet_1_piece_1)
    with BuildSketch(Plane(origin=(15, 6.333609377, -55.4), x_dir=(-1, 0, 0), z_dir=(0, 0, -1)), Plane(origin=(15, 15.833609377, -55.4), x_dir=(0, -1, 0), z_dir=(0, 0, -1))) as fillet_1_piece_2:
        with BuildLine():
            CenterArc((FILLET_1_R, FILLET_1_R), FILLET_1_R, 180, 90)
            Line((0, FILLET_1_R), (0, 0))
            Line((0, 0), (FILLET_1_R, 0))
        make_face()
    extrude(amount=2)
    with BuildSketch(Plane(origin=(15, 15.833609377, -57.4), x_dir=(0, -1, 0), z_dir=(0, 0, -1)), Plane(origin=(15, 6.333609377, -57.4), x_dir=(-1, 0, 0), z_dir=(0, 0, -1))) as fillet_1_piece_3:
        with BuildLine():
            CenterArc((FILLET_1_R, FILLET_1_R), FILLET_1_R, 180, 90)
            Line((0, FILLET_1_R), (0, 0))
            Line((0, 0), (FILLET_1_R, 0))
        make_face()
    extrude(amount=1)
    # the kernel refuses this fillet: 5 mm, written as the material it takes off along each edge
    with BuildSketch(Plane(origin=(16, 5.333609377, -57.4), x_dir=(0, 1, 0), z_dir=(0, 0, -1)), Plane(origin=(16, 16.833609377, -57.4), x_dir=(-1, 0, 0), z_dir=(0, 0, -1)), Plane(origin=(22.25, 23.833609377, -57.4), x_dir=(-1, 0, 0), z_dir=(0, 0, -1))) as fillet_1_2_piece_1:
        with BuildLine():
            CenterArc((FILLET_1_R, -FILLET_1_R), FILLET_1_R, 90, 90)
            Line((0, -FILLET_1_R), (0, 0))
            Line((0, 0), (FILLET_1_R, 0))
        make_face()
    extrude(amount=13.5, mode=Mode.SUBTRACT)
    with BuildSketch(Plane(origin=(22.25, 23.833609377, -42.9), x_dir=(-1, 0, 0), z_dir=(0, 0, -1))) as fillet_1_2_piece_2:
        with BuildLine():
            CenterArc((FILLET_1_R, -FILLET_1_R), FILLET_1_R, 90, 90)
            Line((0, -FILLET_1_R), (0, 0))
            Line((0, 0), (FILLET_1_R, 0))
        make_face()
    extrude(amount=14.5, mode=Mode.SUBTRACT)

    # 镜向2 outline → 镜向2 (add)
    with BuildSketch(Plane.XY.offset(MIRROR_START)):
        with BuildLine():
            ThreePointArc((-22.25, 3.833609377), (-26, 0.083609377), (-22.25, -3.666390623))
            Line((-22.25, -3.666390623), (0, -3.666390623))
            Line((0, -3.666390623), (0, 6.333609377))
            Line((0, 6.333609377), (-10, 6.333609377))
            ThreePointArc((-10, 6.333609377), (-13.446012188, 7.710765191), (-14.993746089, 11.083609377))
            ThreePointArc((-14.993746089, 11.083609377), (-13.446012188, 14.456453564), (-10, 15.833609377))
            Line((-10, 15.833609377), (0, 15.833609377))
            Line((0, 15.833609377), (0, 23.833609377))
            Line((0, 23.833609377), (-17.25, 23.833609377))
            ThreePointArc((-17.25, 23.833609377), (-20.785533906, 22.369143283), (-22.25, 18.833609377))
            Line((-22.25, 18.833609377), (-22.25, 3.833609377))
        make_face()
        with Locations((-22.25, 0.083609377)):
            Circle(MIRROR_2_OUTLINE_R, mode=Mode.SUBTRACT)
    extrude(amount=MIRROR_2_DEPTH)

    # Mirror 2 2 outline → Mirror 2 2 (add)
    with BuildSketch(Plane.XY.offset(MIRROR_START_2)):
        with BuildLine():
            ThreePointArc((-22.25, 3.833609377), (-26, 0.083609377), (-22.25, -3.666390623))
            Line((-22.25, -3.666390623), (0, -3.666390623))
            Line((0, -3.666390623), (0, 6.333609377))
            Line((0, 6.333609377), (-10, 6.333609377))
            ThreePointArc((-10, 6.333609377), (-13.446012188, 7.710765191), (-14.993746089, 11.083609377))
            ThreePointArc((-14.993746089, 11.083609377), (-13.446012188, 14.456453564), (-10, 15.833609377))
            Line((-10, 15.833609377), (0, 15.833609377))
            Line((0, 15.833609377), (0, 23.833609377))
            Line((0, 23.833609377), (-17.25, 23.833609377))
            ThreePointArc((-17.25, 23.833609377), (-20.785533906, 22.369143283), (-22.25, 18.833609377))
            Line((-22.25, 18.833609377), (-22.25, 3.833609377))
        make_face()
        with Locations((-22.25, 0.083609377)):
            Circle(MIRROR_2_2_OUTLINE_R, mode=Mode.SUBTRACT)
        with BuildLine():
            Line((-1, -2.666390623), (-18.377016654, -2.666390623))
            ThreePointArc((-18.377016654, -2.666390623), (-17.822516003, 1.804041142), (-21.25, 4.727153282))
            Line((-21.25, 4.727153282), (-21.25, 17.833609377))
            ThreePointArc((-21.25, 17.833609377), (-19.785533906, 21.369143283), (-16.25, 22.833609377))
            Line((-16.25, 22.833609377), (-1, 22.833609377))
            Line((-1, 22.833609377), (-1, 16.833609377))
            Line((-1, 16.833609377), (-11, 16.833609377))
            ThreePointArc((-11, 16.833609377), (-14.535533906, 15.369143283), (-16, 11.833609377))
            Line((-16, 11.833609377), (-16, 10.333609377))
            ThreePointArc((-16, 10.333609377), (-14.535533906, 6.798075471), (-11, 5.333609377))
            Line((-11, 5.333609377), (-1, 5.333609377))
            Line((-1, 5.333609377), (-1, -2.666390623))
        make_face(mode=Mode.SUBTRACT)
    extrude(amount=MIRROR_2_2_DEPTH)

    # 镜向3: 拉伸1, 拉伸2 across plane
    add(extrude_1.mirror(Plane(origin=(0, 0, 0), x_dir=(0, 0, 1), z_dir=(1, 0, 0))))
    add(extrude_2.mirror(Plane(origin=(0, 0, 0), x_dir=(0, 0, 1), z_dir=(1, 0, 0))))


solid = part.part
